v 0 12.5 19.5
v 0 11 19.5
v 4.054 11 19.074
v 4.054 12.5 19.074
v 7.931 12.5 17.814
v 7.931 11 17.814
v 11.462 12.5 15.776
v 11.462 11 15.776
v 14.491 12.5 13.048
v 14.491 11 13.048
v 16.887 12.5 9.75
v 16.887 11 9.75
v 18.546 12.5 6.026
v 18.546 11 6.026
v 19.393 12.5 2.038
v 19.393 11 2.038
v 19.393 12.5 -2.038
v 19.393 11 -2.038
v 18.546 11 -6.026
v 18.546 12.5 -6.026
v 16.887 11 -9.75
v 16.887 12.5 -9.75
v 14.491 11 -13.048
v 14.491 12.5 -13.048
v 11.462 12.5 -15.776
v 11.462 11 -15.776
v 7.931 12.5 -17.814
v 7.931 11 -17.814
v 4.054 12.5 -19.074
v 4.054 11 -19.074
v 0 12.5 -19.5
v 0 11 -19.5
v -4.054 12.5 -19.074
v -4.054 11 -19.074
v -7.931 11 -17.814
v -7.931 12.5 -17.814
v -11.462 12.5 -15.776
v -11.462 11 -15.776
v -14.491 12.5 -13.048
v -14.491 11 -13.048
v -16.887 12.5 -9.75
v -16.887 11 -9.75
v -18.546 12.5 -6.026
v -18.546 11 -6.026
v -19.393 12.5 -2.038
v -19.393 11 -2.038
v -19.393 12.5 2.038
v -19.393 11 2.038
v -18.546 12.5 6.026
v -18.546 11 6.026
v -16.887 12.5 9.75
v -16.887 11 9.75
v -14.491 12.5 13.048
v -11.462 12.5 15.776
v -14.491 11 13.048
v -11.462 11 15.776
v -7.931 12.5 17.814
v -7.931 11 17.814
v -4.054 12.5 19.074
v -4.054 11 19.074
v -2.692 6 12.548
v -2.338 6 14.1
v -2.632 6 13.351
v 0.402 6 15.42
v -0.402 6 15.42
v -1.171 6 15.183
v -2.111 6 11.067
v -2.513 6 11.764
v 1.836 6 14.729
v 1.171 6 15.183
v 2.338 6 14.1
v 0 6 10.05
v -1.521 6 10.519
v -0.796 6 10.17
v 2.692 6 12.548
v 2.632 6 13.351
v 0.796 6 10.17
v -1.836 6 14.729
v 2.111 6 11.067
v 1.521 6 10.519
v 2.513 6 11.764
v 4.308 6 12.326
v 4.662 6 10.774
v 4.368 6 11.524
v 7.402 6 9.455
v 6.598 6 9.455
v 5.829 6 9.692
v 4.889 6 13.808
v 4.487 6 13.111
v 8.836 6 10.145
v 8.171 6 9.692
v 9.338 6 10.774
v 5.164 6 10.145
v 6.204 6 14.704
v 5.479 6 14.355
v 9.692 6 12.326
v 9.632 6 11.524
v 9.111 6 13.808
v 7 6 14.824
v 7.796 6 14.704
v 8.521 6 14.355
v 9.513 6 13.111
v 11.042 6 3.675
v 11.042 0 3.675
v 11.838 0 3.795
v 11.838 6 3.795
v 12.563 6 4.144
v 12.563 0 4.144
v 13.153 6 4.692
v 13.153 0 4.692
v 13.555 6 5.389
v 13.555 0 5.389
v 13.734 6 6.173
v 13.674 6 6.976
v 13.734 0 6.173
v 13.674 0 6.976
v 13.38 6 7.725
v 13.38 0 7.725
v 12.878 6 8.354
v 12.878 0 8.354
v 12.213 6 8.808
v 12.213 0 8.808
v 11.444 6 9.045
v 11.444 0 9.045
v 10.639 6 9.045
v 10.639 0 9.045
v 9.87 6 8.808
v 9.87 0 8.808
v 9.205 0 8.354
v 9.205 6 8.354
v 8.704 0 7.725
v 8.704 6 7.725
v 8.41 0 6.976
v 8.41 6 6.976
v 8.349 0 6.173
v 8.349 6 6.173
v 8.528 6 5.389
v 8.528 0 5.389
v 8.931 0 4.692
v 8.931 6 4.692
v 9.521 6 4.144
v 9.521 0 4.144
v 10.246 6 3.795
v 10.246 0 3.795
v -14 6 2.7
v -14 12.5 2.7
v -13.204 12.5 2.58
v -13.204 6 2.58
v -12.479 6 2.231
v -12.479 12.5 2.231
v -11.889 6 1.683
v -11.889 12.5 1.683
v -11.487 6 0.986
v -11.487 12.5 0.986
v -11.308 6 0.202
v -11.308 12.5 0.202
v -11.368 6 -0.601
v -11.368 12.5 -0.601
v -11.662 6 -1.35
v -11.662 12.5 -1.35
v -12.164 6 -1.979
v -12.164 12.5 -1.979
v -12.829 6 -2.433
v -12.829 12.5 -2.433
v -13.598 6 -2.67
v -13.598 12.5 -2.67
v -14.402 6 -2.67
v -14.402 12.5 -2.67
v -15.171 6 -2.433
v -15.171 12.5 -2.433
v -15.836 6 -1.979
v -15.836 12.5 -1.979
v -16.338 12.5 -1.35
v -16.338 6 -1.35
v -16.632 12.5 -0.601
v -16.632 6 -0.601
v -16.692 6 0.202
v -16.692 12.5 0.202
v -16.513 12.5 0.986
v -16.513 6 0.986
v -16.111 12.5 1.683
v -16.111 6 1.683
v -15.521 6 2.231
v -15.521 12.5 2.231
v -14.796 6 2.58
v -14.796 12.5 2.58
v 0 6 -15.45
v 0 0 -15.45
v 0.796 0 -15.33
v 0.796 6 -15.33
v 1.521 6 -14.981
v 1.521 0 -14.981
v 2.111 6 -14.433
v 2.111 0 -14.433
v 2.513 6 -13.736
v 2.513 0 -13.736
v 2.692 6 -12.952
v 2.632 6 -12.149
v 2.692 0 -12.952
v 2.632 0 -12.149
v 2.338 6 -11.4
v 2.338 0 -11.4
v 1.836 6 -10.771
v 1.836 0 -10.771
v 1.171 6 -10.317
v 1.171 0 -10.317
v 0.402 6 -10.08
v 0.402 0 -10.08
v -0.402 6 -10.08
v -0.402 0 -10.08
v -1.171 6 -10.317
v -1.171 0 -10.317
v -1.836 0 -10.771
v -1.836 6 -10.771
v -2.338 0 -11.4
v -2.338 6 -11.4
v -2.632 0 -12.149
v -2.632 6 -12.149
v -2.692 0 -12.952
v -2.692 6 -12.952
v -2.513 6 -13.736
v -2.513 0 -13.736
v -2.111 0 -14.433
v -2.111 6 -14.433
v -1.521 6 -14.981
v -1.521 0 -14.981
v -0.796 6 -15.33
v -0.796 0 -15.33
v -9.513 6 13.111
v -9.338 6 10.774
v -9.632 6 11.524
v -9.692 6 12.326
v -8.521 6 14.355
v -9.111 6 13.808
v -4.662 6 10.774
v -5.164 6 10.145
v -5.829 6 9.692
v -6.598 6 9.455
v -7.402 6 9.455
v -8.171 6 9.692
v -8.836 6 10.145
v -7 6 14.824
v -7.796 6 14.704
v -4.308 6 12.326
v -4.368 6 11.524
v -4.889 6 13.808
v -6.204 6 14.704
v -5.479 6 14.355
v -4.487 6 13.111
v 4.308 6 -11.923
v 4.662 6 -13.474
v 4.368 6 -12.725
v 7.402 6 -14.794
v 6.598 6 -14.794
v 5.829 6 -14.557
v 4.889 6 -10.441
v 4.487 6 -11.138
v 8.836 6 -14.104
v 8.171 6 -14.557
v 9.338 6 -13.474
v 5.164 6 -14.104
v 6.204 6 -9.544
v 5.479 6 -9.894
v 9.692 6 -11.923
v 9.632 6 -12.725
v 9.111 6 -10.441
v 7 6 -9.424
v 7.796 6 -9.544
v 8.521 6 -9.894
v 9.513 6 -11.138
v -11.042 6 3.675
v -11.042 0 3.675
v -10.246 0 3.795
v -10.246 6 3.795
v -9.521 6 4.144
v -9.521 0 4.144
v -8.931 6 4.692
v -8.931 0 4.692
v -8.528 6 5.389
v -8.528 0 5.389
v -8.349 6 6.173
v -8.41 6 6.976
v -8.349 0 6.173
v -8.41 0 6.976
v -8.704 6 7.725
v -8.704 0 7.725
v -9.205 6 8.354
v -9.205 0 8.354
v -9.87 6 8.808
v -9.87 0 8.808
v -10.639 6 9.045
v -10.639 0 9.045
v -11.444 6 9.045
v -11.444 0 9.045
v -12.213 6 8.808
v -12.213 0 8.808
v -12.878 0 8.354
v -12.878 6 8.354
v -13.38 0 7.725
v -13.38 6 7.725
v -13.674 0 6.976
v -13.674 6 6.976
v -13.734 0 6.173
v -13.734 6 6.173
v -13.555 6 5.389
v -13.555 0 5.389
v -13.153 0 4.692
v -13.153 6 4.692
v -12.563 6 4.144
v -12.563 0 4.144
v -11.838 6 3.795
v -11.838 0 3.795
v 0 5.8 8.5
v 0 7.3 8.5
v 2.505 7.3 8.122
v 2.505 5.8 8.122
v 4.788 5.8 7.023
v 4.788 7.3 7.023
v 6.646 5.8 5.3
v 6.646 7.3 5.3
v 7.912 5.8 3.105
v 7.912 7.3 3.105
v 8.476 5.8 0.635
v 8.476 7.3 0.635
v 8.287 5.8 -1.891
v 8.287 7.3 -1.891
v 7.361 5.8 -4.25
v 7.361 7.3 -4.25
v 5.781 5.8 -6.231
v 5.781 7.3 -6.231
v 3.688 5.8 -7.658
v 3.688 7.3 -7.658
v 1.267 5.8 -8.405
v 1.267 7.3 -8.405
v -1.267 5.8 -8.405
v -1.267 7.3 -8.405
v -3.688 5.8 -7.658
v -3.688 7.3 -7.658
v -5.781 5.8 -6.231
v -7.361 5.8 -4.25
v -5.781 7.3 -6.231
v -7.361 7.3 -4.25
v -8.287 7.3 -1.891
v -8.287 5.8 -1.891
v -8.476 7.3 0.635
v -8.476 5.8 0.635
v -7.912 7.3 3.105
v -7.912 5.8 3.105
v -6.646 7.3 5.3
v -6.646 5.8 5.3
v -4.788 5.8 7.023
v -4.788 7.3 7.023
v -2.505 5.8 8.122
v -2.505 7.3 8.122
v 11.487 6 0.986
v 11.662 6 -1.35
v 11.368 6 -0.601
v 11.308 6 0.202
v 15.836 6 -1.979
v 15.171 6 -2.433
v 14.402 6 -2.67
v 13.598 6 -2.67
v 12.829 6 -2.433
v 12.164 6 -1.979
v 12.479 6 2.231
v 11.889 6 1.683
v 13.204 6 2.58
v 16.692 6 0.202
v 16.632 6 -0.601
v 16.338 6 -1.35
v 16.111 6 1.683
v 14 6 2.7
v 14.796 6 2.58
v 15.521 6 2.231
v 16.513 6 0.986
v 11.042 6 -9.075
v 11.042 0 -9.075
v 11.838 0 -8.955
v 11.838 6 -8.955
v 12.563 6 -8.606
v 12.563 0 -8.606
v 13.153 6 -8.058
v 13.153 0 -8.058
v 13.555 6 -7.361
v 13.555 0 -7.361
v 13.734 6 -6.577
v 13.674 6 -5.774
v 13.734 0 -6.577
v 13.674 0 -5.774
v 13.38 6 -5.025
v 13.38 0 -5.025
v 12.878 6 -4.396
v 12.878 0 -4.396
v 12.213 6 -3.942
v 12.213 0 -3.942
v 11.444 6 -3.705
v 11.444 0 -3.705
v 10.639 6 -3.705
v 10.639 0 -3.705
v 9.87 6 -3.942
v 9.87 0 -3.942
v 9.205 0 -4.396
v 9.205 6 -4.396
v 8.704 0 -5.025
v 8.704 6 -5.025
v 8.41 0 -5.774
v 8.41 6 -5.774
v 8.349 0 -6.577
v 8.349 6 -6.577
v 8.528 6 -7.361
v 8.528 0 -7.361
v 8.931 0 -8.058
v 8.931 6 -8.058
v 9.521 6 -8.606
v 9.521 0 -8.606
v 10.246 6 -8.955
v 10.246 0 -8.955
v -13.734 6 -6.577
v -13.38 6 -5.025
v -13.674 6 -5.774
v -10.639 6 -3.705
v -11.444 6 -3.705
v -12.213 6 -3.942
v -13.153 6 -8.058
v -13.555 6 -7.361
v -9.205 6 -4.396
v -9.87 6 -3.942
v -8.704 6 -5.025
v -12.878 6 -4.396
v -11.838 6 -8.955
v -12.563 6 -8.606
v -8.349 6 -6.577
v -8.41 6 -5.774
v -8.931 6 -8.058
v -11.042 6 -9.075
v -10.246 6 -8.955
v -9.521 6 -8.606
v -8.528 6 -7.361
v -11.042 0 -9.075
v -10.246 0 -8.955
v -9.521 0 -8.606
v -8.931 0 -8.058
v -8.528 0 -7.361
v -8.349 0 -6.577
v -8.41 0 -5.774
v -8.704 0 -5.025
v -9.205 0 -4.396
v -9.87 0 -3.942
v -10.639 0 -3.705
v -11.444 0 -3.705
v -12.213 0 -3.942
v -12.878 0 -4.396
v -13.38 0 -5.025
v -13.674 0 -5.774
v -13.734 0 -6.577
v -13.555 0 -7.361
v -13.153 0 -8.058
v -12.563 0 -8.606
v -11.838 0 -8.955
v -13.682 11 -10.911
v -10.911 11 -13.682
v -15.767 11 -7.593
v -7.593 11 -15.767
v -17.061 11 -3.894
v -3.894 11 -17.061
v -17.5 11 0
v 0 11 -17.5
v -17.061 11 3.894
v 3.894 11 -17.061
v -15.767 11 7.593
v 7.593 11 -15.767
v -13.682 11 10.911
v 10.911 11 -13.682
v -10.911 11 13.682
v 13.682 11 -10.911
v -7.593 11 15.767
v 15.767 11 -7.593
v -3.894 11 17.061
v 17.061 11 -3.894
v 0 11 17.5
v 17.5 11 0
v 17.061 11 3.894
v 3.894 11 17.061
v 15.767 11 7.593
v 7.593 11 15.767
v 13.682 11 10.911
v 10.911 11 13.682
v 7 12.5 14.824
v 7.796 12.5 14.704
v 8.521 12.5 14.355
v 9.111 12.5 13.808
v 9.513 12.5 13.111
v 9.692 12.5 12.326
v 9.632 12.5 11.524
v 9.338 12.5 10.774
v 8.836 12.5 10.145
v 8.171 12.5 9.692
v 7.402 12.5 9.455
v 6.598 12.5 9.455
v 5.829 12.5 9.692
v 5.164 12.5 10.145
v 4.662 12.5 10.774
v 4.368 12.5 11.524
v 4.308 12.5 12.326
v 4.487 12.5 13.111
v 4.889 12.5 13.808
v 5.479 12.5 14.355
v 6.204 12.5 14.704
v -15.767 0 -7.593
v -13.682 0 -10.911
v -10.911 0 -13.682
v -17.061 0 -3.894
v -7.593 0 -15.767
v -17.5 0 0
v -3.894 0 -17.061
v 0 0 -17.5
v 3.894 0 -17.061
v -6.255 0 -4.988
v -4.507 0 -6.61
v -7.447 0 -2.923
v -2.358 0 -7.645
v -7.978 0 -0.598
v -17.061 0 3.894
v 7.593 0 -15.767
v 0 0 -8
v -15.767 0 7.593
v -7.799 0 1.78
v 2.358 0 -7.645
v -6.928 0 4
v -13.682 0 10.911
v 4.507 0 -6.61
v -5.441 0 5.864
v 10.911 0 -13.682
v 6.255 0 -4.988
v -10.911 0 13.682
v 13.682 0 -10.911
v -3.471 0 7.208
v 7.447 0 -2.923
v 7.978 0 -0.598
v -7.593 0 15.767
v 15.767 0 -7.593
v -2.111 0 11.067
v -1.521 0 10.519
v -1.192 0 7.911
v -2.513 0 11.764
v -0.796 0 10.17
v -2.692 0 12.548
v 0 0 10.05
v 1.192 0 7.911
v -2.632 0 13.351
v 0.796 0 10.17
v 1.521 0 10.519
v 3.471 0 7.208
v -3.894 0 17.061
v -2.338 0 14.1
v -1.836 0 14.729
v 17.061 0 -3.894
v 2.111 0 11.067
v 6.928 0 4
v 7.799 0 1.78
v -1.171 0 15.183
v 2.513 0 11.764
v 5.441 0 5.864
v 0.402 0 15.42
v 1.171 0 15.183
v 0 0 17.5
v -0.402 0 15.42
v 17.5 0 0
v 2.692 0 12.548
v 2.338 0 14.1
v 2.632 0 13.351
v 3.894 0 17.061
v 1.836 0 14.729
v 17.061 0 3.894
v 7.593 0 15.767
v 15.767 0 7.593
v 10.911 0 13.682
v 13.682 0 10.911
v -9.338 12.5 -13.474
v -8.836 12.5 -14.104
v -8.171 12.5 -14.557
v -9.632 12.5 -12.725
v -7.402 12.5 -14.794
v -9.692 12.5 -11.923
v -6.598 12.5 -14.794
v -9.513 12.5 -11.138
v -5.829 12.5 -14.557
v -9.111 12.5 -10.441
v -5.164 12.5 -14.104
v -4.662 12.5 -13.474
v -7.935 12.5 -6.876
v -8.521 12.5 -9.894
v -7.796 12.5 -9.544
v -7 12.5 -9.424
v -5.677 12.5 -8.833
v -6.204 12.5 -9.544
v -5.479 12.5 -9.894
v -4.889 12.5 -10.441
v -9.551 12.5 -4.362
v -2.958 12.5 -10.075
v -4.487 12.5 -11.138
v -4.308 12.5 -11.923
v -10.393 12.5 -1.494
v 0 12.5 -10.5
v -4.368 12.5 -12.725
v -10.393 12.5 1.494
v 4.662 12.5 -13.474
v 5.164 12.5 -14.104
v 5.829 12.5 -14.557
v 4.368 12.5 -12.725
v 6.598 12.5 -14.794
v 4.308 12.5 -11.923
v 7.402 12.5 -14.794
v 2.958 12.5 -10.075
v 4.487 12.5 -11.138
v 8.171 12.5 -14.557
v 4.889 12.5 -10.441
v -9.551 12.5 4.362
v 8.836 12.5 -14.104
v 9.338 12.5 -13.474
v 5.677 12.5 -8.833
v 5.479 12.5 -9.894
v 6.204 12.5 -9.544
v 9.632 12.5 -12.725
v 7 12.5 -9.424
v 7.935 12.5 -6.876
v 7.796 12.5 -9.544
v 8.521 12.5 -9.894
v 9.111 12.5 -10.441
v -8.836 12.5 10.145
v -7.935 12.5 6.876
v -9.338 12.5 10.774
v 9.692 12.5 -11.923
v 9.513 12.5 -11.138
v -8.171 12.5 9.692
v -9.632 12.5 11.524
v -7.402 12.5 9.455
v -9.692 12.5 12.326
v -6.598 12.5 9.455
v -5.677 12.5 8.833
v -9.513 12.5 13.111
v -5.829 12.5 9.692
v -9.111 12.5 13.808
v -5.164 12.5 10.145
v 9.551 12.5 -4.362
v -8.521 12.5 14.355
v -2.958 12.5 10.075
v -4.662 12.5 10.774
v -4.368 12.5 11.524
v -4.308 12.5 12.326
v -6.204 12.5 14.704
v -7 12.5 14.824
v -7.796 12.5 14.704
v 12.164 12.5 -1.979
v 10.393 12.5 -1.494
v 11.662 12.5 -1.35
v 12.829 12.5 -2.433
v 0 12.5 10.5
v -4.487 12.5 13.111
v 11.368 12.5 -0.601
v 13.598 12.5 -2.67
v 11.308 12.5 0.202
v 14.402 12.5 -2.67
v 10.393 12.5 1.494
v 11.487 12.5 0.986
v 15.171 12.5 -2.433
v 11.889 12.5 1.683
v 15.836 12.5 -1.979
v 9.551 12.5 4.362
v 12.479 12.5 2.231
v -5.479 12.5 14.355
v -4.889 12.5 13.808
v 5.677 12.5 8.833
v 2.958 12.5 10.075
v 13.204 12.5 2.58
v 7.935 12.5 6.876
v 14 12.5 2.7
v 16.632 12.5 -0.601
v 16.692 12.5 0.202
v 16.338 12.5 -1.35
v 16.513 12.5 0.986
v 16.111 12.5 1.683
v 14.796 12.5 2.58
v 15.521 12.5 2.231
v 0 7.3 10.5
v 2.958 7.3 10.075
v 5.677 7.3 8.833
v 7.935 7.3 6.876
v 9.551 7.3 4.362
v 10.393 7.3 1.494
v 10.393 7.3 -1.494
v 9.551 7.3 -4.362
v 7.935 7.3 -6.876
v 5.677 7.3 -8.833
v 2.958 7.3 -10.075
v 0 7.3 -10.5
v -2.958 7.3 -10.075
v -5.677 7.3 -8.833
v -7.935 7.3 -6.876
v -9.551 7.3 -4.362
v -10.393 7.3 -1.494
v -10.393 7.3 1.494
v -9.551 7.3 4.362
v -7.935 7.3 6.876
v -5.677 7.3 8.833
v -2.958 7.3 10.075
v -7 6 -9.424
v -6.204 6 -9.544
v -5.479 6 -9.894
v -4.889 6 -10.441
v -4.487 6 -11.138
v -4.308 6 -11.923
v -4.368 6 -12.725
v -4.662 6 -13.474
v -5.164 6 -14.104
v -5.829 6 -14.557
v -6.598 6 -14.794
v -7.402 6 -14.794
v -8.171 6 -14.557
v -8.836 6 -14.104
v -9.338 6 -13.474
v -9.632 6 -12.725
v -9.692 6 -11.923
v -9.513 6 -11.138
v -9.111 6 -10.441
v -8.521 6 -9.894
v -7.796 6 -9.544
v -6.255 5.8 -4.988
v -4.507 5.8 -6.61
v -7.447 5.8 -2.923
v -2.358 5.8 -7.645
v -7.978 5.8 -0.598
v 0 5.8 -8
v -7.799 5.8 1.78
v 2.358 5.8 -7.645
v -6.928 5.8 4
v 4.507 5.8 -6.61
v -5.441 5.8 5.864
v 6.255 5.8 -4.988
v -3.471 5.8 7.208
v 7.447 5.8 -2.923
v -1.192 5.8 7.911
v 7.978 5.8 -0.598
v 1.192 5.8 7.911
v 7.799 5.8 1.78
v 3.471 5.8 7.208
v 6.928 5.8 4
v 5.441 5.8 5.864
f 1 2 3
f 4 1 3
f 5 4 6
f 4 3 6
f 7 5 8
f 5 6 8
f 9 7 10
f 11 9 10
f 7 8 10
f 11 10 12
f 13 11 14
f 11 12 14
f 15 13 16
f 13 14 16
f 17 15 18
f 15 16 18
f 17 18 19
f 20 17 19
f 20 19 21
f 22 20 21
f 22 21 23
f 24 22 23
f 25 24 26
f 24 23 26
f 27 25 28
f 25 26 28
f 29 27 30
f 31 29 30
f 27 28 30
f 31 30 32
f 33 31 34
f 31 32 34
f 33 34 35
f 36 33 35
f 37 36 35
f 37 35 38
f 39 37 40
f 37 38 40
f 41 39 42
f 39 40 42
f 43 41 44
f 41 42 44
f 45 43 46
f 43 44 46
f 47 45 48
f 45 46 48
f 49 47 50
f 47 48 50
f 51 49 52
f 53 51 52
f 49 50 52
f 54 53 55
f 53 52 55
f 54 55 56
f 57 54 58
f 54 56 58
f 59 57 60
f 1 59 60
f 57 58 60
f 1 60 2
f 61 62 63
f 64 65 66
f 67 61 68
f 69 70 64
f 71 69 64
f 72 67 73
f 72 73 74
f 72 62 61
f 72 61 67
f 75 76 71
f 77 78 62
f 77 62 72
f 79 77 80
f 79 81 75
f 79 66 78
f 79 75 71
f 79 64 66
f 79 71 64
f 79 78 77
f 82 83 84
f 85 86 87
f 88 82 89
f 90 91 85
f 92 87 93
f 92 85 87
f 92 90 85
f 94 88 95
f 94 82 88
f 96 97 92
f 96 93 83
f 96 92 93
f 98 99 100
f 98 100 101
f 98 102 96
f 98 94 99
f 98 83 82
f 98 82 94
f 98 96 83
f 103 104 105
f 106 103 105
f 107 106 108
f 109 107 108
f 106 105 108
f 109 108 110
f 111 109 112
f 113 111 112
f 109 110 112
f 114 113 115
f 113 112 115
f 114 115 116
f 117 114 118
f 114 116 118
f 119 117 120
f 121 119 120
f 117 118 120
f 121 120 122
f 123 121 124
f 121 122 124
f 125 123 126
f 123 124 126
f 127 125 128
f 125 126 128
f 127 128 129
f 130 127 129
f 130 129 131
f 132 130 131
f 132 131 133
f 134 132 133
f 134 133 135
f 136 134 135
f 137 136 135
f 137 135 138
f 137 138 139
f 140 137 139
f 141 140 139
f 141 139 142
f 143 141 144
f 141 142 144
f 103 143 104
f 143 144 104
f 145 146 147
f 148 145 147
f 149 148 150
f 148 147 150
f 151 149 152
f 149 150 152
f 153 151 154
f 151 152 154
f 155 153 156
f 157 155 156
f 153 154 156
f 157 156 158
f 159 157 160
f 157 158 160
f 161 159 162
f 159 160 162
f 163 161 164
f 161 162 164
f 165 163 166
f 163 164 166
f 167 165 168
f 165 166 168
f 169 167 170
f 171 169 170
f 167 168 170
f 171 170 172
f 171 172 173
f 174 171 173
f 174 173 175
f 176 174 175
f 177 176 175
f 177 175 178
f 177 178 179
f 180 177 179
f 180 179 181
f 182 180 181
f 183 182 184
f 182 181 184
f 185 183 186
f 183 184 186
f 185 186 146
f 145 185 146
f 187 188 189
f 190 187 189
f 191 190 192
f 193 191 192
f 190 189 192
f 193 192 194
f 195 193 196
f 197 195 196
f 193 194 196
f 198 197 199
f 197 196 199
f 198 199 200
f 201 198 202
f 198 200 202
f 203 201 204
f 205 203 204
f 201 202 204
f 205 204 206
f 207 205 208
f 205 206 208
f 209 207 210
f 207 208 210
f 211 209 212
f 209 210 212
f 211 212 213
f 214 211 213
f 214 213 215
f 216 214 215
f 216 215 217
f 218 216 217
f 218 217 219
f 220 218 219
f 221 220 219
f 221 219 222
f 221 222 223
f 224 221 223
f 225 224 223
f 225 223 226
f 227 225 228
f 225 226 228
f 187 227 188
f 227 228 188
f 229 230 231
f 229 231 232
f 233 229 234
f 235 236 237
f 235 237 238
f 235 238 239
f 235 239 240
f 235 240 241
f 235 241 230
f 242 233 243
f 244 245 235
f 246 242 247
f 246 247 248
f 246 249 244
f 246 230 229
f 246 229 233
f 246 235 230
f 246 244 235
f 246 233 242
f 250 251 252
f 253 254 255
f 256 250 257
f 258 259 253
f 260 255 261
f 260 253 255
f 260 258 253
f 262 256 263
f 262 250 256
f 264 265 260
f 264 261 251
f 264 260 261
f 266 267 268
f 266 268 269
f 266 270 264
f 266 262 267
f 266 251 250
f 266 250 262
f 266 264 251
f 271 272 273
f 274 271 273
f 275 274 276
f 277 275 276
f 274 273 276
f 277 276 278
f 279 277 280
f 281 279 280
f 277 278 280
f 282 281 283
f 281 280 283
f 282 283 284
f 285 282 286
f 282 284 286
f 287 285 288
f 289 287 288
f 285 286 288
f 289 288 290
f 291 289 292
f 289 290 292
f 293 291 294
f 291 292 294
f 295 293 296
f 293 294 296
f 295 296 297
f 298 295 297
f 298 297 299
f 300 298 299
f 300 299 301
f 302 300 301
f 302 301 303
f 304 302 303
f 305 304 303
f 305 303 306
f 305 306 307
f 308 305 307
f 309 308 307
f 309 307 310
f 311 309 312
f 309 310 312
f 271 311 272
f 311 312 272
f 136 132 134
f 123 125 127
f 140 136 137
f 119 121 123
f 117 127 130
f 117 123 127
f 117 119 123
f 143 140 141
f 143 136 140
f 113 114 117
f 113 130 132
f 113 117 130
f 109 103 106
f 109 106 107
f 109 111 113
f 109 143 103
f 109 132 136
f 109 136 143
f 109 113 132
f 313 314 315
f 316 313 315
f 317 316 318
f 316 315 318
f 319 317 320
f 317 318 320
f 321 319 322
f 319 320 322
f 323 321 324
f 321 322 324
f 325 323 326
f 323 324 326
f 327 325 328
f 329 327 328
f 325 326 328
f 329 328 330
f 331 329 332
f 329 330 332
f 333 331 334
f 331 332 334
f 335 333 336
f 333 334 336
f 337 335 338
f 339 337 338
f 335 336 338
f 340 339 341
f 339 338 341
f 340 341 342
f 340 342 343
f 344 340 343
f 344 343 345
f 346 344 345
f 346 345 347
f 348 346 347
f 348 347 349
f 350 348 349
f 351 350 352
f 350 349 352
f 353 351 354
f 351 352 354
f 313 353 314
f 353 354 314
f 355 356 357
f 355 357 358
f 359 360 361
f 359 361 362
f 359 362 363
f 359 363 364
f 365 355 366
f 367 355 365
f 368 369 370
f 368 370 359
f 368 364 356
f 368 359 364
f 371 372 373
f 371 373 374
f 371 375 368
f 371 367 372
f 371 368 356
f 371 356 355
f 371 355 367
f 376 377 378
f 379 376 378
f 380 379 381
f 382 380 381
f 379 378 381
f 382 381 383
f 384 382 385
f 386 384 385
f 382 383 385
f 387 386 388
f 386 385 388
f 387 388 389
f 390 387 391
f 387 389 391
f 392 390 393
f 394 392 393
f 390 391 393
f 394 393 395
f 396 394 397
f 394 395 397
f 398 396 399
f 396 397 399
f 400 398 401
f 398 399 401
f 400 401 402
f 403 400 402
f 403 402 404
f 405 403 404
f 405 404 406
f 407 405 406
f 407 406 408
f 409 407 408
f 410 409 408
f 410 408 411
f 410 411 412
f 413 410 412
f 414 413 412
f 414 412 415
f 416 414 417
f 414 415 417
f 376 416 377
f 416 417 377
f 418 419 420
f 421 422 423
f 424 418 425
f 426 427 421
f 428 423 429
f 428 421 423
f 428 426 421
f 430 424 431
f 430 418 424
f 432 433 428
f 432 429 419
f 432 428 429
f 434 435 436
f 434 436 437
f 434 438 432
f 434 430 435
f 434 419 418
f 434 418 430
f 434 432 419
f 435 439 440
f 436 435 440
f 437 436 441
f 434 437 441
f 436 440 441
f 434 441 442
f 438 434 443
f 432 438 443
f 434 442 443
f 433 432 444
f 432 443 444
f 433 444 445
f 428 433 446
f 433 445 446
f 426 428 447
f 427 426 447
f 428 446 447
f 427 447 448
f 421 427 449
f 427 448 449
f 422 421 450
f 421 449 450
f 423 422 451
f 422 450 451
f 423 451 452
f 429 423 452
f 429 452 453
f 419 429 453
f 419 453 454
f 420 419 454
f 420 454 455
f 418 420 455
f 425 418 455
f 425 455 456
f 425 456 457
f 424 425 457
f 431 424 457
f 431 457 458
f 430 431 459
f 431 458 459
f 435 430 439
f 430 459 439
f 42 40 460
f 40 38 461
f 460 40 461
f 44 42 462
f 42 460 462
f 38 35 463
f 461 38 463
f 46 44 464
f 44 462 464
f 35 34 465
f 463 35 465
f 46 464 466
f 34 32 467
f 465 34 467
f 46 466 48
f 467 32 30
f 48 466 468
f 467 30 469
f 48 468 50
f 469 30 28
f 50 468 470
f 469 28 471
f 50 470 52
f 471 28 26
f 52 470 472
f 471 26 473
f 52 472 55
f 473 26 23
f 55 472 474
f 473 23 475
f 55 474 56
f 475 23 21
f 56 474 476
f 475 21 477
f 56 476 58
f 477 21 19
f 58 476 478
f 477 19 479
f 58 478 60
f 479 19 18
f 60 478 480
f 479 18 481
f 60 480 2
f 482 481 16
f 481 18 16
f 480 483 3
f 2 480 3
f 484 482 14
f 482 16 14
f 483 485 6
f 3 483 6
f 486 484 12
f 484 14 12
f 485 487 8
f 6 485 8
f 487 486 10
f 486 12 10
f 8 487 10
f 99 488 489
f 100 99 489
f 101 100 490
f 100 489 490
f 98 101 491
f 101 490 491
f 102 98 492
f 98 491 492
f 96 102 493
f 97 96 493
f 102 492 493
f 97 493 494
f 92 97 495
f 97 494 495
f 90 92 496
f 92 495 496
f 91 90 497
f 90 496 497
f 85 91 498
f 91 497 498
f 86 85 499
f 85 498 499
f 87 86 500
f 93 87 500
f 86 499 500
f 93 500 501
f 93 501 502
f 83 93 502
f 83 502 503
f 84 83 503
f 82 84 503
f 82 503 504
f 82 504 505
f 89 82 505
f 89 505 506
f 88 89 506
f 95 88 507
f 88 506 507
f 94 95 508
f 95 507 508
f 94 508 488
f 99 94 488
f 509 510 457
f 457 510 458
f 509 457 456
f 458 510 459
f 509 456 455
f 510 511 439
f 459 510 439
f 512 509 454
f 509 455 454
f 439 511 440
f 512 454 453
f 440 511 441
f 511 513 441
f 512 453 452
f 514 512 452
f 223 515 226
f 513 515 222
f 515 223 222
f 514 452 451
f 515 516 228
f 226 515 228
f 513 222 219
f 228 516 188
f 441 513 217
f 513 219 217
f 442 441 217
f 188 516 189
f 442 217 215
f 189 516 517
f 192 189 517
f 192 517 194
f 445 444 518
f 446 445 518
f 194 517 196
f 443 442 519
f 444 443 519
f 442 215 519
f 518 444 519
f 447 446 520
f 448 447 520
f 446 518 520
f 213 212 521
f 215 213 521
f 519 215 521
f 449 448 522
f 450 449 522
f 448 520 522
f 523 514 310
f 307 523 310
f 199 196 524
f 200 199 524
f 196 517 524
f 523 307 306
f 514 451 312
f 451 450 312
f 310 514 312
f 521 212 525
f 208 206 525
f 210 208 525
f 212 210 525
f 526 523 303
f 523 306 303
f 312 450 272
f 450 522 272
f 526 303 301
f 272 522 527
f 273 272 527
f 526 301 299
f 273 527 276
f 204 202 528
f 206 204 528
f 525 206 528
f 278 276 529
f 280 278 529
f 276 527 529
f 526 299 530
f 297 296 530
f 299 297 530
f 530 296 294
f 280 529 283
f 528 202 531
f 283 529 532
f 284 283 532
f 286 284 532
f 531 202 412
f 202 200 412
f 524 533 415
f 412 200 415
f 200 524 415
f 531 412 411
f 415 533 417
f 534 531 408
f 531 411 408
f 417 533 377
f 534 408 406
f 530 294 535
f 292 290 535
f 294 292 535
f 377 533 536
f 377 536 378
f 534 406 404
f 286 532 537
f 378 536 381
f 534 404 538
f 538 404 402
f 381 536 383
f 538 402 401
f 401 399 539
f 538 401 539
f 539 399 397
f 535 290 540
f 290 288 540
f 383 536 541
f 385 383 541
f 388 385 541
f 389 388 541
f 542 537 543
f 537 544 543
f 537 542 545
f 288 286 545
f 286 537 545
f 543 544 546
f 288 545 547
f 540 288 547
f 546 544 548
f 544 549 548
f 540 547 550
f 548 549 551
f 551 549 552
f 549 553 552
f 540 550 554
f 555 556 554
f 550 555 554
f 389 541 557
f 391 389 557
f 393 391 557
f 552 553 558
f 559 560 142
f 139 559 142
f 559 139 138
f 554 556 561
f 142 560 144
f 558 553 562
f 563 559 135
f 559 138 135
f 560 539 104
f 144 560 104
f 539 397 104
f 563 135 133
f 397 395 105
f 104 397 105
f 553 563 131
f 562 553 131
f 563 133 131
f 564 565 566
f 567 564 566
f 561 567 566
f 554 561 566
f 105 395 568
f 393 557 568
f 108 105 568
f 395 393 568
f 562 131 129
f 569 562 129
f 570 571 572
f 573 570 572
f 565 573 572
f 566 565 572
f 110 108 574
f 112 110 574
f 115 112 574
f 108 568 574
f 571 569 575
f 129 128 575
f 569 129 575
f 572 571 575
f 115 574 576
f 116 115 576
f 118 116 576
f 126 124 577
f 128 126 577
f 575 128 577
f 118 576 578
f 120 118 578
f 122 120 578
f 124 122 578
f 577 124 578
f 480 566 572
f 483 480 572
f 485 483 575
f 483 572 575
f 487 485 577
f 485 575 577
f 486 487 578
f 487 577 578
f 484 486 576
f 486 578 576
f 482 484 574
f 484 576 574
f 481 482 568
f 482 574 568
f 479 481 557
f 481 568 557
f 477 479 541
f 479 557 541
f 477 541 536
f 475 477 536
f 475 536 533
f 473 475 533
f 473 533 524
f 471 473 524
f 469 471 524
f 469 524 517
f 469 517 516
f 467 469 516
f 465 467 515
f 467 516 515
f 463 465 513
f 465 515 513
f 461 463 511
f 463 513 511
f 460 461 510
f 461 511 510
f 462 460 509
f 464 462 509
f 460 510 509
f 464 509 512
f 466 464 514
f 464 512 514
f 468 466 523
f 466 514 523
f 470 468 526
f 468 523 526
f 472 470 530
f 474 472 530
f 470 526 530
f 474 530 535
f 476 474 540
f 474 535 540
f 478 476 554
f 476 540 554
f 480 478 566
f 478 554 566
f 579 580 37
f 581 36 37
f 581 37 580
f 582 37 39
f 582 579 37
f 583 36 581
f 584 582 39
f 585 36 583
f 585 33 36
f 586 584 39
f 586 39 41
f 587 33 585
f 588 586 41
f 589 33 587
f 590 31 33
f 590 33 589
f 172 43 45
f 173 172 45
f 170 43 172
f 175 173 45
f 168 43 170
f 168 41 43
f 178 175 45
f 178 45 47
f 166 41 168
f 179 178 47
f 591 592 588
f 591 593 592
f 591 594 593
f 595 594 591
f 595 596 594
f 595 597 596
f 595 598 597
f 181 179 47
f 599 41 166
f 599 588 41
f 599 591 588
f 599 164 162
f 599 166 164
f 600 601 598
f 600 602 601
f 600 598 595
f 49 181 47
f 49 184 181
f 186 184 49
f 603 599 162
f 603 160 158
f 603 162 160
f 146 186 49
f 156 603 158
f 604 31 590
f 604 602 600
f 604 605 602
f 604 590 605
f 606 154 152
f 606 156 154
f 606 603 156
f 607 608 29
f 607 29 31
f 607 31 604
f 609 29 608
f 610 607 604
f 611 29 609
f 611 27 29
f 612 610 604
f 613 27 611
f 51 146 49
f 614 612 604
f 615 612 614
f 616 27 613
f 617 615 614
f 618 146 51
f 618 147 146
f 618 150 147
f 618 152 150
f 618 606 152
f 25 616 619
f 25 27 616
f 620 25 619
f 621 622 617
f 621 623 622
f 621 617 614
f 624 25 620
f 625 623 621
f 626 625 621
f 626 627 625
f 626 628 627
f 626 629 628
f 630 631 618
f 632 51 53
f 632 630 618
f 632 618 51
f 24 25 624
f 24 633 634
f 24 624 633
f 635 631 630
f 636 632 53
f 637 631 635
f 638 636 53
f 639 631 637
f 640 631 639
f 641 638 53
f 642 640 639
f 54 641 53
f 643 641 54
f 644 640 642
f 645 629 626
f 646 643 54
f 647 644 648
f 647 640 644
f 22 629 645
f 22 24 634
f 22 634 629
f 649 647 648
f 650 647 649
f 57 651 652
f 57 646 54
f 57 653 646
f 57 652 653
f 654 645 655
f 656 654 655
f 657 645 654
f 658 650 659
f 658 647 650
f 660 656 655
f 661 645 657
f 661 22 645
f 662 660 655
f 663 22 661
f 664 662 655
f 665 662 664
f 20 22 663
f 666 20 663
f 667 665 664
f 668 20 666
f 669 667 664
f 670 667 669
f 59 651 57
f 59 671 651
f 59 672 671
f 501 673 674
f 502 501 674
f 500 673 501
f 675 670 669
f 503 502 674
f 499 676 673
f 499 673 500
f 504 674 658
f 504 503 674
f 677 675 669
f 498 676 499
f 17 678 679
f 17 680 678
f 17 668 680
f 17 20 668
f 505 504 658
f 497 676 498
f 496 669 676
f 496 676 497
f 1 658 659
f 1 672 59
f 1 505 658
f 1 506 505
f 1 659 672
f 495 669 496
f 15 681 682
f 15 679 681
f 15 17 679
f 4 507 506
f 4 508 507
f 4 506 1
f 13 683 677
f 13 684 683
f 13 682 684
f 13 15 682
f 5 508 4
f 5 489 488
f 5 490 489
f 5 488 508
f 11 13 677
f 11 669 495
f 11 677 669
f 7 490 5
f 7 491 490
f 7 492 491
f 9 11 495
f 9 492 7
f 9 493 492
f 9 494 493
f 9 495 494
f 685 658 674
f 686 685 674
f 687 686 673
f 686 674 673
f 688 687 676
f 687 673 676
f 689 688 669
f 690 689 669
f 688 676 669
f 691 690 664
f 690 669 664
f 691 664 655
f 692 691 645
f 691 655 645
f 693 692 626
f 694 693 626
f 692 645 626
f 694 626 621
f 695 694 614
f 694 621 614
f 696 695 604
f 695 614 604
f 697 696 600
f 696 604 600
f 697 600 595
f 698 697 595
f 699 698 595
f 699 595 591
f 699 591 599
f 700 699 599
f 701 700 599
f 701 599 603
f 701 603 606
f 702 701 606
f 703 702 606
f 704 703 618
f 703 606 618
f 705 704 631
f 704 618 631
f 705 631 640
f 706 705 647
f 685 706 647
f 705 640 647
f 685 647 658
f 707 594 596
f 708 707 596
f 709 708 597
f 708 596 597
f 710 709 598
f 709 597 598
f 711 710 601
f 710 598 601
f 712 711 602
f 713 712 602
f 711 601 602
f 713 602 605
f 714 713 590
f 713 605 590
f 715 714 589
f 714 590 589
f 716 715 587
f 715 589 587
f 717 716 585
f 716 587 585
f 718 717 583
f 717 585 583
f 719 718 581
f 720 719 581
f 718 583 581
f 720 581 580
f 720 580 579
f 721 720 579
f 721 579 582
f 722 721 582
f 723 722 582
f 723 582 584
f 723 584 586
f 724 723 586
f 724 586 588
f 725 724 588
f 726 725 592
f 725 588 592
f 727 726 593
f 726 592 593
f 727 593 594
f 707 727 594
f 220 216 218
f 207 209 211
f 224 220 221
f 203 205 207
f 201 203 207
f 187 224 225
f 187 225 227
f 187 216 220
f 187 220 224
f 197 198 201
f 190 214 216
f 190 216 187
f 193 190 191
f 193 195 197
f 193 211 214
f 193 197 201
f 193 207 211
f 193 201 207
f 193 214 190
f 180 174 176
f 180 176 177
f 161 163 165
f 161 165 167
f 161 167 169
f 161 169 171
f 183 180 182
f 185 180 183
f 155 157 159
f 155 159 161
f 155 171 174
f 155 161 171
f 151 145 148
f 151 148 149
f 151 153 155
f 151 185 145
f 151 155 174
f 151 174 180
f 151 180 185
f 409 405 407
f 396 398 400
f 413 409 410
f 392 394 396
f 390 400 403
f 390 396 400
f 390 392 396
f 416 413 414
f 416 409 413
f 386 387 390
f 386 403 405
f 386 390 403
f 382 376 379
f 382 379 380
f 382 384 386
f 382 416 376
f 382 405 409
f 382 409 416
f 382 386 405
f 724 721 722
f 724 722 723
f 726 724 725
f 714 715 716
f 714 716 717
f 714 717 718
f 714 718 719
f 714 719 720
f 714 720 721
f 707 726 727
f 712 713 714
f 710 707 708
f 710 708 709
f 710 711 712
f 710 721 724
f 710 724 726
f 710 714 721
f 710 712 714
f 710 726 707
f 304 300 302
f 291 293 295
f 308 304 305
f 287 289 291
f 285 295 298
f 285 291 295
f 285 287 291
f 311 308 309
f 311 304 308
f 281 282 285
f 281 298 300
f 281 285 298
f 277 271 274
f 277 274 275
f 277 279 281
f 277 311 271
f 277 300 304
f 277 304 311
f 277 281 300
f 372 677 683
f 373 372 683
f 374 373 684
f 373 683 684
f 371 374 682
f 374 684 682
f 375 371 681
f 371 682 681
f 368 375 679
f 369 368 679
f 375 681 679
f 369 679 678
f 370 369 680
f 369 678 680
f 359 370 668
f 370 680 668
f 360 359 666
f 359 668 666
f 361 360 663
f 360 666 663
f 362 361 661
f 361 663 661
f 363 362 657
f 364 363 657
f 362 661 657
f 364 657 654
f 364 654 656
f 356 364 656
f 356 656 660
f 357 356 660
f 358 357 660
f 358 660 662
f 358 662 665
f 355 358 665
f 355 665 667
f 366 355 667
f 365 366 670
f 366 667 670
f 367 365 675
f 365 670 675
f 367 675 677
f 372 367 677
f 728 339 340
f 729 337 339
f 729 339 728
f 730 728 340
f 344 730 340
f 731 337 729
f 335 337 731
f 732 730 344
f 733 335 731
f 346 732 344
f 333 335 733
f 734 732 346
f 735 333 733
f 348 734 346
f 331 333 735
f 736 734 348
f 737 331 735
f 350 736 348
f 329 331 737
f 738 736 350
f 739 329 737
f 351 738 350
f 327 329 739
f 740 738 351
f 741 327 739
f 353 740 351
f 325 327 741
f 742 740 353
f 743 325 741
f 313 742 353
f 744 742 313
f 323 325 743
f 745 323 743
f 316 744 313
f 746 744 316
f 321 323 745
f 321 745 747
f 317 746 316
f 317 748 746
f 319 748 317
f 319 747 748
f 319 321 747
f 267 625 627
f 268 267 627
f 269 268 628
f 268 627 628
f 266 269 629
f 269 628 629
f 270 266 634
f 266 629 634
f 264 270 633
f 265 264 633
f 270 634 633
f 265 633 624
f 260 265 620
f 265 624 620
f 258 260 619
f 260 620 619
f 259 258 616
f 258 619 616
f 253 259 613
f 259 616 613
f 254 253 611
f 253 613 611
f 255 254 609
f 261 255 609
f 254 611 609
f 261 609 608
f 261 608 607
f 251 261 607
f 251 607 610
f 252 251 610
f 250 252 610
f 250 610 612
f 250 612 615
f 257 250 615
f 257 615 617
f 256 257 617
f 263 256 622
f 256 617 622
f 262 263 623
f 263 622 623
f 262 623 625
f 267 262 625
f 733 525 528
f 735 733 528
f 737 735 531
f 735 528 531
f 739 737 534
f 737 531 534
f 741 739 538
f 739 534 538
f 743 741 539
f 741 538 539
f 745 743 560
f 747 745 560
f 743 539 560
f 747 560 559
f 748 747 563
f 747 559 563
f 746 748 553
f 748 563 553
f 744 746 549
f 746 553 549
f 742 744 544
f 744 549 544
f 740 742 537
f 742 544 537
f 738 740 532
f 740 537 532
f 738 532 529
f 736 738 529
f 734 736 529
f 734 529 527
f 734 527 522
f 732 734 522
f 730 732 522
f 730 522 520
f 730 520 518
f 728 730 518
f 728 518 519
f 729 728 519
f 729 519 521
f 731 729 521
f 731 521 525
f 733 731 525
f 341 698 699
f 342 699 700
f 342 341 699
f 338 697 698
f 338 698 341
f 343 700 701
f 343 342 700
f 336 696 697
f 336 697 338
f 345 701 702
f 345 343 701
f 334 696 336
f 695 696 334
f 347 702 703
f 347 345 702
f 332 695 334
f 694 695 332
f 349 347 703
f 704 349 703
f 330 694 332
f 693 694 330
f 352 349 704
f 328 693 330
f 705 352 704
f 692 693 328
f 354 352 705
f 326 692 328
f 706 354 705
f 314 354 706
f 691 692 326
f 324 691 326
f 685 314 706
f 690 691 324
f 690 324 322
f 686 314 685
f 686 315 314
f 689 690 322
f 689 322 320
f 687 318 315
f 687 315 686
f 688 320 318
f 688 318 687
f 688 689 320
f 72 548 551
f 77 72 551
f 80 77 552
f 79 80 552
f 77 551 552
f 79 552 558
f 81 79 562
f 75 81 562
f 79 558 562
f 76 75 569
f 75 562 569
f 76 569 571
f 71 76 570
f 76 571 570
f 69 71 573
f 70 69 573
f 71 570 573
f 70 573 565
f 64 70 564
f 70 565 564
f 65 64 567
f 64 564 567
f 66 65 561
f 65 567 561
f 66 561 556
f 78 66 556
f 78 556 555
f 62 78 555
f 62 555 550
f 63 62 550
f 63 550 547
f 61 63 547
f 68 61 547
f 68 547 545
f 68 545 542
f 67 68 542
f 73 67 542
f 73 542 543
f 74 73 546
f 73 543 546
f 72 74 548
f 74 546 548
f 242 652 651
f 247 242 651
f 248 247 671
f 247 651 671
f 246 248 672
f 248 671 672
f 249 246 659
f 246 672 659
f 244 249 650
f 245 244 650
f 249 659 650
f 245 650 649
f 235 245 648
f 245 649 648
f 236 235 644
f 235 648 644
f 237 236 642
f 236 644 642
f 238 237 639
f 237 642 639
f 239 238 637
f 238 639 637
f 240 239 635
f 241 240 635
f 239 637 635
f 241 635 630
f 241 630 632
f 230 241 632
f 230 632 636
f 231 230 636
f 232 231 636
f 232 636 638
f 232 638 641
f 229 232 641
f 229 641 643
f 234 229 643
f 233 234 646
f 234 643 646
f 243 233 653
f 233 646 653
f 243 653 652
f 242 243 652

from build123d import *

# Parameters (mm, degrees)
SKETCH1_R           = 17.5
BOSS_EXTRUDE1_DEPTH = 11
SKETCH2_R           = 19.5
BOSS_EXTRUDE2_DEPTH = 1.5
SKETCH3_R           = 10.5
CUT_EXTRUDE1_DEPTH  = 5.2
SKETCH4_R           = 8.5
CUT_EXTRUDE2_DEPTH  = 1.5
CUT_EXTRUDE4_REACH  = 32.278
SKETCH7_R           = 8
SKETCH9_R           = 2.7
CUT_EXTRUDE5_DEPTH  = 6
SKETCH10_R          = 2.7
CUT_EXTRUDE6_DEPTH  = 6.5


with BuildPart() as part:
    # Sketch1 → Boss-Extrude1 (new body)
    with BuildSketch(Plane(origin=(0, 0, 0), x_dir=(1, 0, 0), z_dir=(0, 1, 0))):
        with Locations(Location((0, 0, 0), (0, 0, 270))):
            Circle(SKETCH1_R)
    extrude(amount=BOSS_EXTRUDE1_DEPTH)

    # Sketch2 → Boss-Extrude2 (add)
    with BuildSketch(Plane(origin=(0, 11, 0), x_dir=(1, 0, 0), z_dir=(0, 1, 0))):
        with Locations(Location((0, 0, 0), (0, 0, 270))):
            Circle(SKETCH2_R)
    extrude(amount=BOSS_EXTRUDE2_DEPTH)

    # Sketch3 → Cut-Extrude1 (cut)
    with BuildSketch(Plane(origin=(0, 12.5, 0), x_dir=(1, 0, 0), z_dir=(0, 1, 0))):
        with Locations(Location((0, 0, 0), (0, 0, 270))):
            Circle(SKETCH3_R)
    extrude(amount=-CUT_EXTRUDE1_DEPTH, mode=Mode.SUBTRACT)

    # Sketch4 → Cut-Extrude2 (cut)
    with BuildSketch(Plane(origin=(0, 7.3, 0), x_dir=(1, 0, 0), z_dir=(0, 1, 0))):
        with Locations(Location((0, 0, 0), (0, 0, 270))):
            Circle(SKETCH4_R)
    extrude(amount=-CUT_EXTRUDE2_DEPTH, mode=Mode.SUBTRACT)

    # Sketch7 → Cut-Extrude4 (cut, up to next)
    with BuildSketch(Plane.XZ, mode=Mode.PRIVATE) as cut_extrude4_sk1:
        with Locations(Location((0, 0, 0), (0, 0, 270))):
            Circle(SKETCH7_R)
    cut_extrude4_tool1 = extrude(cut_extrude4_sk1.sketch, amount=-CUT_EXTRUDE4_REACH, mode=Mode.PRIVATE) & part.part
    add(cut_extrude4_tool1.solids().sort_by_distance((0, 0, 0))[0], mode=Mode.SUBTRACT)

    # Sketch9 → Cut-Extrude5 (cut)
    with BuildSketch(Plane.XZ):
        with Locations(Location((0, 12.75, 0), (0, 0, 270))):
            Circle(SKETCH9_R)
        with Locations(Location((11.041823898, 6.375, 0), (0, 0, 270))):
            Circle(SKETCH9_R)
        with Locations(Location((11.041823898, -6.375, 0), (0, 0, 270))):
            Circle(SKETCH9_R)
        with Locations(Location((0, -12.75, 0), (0, 0, 270))):
            Circle(SKETCH9_R)
        with Locations(Location((-11.041823898, -6.375, 0), (0, 0, 270))):
            Circle(SKETCH9_R)
        with Locations(Location((-11.041823898, 6.375, 0), (0, 0, 270))):
            Circle(SKETCH9_R)
    extrude(amount=-CUT_EXTRUDE5_DEPTH, mode=Mode.SUBTRACT)

    # Sketch10 → Cut-Extrude6 (cut)
    with BuildSketch(Plane(origin=(0, 12.5, 0), x_dir=(1, 0, 0), z_dir=(0, 1, 0))):
        with Locations(Location((14, 0, 0), (0, 0, 270))):
            Circle(SKETCH10_R)
        with Locations(Location((7, -12.124355653, 0), (0, 0, 270))):
            Circle(SKETCH10_R)
        with Locations(Location((-7, -12.124355653, 0), (0, 0, 270))):
            Circle(SKETCH10_R)
        with Locations(Location((-14, 0, 0), (0, 0, 270))):
            Circle(SKETCH10_R)
        with Locations(Location((-7, 12.124355653, 0), (0, 0, 270))):
            Circle(SKETCH10_R)
        with Locations(Location((7, 12.124355653, 0), (0, 0, 270))):
            Circle(SKETCH10_R)
    extrude(amount=-CUT_EXTRUDE6_DEPTH, mode=Mode.SUBTRACT)


solid = part.part
